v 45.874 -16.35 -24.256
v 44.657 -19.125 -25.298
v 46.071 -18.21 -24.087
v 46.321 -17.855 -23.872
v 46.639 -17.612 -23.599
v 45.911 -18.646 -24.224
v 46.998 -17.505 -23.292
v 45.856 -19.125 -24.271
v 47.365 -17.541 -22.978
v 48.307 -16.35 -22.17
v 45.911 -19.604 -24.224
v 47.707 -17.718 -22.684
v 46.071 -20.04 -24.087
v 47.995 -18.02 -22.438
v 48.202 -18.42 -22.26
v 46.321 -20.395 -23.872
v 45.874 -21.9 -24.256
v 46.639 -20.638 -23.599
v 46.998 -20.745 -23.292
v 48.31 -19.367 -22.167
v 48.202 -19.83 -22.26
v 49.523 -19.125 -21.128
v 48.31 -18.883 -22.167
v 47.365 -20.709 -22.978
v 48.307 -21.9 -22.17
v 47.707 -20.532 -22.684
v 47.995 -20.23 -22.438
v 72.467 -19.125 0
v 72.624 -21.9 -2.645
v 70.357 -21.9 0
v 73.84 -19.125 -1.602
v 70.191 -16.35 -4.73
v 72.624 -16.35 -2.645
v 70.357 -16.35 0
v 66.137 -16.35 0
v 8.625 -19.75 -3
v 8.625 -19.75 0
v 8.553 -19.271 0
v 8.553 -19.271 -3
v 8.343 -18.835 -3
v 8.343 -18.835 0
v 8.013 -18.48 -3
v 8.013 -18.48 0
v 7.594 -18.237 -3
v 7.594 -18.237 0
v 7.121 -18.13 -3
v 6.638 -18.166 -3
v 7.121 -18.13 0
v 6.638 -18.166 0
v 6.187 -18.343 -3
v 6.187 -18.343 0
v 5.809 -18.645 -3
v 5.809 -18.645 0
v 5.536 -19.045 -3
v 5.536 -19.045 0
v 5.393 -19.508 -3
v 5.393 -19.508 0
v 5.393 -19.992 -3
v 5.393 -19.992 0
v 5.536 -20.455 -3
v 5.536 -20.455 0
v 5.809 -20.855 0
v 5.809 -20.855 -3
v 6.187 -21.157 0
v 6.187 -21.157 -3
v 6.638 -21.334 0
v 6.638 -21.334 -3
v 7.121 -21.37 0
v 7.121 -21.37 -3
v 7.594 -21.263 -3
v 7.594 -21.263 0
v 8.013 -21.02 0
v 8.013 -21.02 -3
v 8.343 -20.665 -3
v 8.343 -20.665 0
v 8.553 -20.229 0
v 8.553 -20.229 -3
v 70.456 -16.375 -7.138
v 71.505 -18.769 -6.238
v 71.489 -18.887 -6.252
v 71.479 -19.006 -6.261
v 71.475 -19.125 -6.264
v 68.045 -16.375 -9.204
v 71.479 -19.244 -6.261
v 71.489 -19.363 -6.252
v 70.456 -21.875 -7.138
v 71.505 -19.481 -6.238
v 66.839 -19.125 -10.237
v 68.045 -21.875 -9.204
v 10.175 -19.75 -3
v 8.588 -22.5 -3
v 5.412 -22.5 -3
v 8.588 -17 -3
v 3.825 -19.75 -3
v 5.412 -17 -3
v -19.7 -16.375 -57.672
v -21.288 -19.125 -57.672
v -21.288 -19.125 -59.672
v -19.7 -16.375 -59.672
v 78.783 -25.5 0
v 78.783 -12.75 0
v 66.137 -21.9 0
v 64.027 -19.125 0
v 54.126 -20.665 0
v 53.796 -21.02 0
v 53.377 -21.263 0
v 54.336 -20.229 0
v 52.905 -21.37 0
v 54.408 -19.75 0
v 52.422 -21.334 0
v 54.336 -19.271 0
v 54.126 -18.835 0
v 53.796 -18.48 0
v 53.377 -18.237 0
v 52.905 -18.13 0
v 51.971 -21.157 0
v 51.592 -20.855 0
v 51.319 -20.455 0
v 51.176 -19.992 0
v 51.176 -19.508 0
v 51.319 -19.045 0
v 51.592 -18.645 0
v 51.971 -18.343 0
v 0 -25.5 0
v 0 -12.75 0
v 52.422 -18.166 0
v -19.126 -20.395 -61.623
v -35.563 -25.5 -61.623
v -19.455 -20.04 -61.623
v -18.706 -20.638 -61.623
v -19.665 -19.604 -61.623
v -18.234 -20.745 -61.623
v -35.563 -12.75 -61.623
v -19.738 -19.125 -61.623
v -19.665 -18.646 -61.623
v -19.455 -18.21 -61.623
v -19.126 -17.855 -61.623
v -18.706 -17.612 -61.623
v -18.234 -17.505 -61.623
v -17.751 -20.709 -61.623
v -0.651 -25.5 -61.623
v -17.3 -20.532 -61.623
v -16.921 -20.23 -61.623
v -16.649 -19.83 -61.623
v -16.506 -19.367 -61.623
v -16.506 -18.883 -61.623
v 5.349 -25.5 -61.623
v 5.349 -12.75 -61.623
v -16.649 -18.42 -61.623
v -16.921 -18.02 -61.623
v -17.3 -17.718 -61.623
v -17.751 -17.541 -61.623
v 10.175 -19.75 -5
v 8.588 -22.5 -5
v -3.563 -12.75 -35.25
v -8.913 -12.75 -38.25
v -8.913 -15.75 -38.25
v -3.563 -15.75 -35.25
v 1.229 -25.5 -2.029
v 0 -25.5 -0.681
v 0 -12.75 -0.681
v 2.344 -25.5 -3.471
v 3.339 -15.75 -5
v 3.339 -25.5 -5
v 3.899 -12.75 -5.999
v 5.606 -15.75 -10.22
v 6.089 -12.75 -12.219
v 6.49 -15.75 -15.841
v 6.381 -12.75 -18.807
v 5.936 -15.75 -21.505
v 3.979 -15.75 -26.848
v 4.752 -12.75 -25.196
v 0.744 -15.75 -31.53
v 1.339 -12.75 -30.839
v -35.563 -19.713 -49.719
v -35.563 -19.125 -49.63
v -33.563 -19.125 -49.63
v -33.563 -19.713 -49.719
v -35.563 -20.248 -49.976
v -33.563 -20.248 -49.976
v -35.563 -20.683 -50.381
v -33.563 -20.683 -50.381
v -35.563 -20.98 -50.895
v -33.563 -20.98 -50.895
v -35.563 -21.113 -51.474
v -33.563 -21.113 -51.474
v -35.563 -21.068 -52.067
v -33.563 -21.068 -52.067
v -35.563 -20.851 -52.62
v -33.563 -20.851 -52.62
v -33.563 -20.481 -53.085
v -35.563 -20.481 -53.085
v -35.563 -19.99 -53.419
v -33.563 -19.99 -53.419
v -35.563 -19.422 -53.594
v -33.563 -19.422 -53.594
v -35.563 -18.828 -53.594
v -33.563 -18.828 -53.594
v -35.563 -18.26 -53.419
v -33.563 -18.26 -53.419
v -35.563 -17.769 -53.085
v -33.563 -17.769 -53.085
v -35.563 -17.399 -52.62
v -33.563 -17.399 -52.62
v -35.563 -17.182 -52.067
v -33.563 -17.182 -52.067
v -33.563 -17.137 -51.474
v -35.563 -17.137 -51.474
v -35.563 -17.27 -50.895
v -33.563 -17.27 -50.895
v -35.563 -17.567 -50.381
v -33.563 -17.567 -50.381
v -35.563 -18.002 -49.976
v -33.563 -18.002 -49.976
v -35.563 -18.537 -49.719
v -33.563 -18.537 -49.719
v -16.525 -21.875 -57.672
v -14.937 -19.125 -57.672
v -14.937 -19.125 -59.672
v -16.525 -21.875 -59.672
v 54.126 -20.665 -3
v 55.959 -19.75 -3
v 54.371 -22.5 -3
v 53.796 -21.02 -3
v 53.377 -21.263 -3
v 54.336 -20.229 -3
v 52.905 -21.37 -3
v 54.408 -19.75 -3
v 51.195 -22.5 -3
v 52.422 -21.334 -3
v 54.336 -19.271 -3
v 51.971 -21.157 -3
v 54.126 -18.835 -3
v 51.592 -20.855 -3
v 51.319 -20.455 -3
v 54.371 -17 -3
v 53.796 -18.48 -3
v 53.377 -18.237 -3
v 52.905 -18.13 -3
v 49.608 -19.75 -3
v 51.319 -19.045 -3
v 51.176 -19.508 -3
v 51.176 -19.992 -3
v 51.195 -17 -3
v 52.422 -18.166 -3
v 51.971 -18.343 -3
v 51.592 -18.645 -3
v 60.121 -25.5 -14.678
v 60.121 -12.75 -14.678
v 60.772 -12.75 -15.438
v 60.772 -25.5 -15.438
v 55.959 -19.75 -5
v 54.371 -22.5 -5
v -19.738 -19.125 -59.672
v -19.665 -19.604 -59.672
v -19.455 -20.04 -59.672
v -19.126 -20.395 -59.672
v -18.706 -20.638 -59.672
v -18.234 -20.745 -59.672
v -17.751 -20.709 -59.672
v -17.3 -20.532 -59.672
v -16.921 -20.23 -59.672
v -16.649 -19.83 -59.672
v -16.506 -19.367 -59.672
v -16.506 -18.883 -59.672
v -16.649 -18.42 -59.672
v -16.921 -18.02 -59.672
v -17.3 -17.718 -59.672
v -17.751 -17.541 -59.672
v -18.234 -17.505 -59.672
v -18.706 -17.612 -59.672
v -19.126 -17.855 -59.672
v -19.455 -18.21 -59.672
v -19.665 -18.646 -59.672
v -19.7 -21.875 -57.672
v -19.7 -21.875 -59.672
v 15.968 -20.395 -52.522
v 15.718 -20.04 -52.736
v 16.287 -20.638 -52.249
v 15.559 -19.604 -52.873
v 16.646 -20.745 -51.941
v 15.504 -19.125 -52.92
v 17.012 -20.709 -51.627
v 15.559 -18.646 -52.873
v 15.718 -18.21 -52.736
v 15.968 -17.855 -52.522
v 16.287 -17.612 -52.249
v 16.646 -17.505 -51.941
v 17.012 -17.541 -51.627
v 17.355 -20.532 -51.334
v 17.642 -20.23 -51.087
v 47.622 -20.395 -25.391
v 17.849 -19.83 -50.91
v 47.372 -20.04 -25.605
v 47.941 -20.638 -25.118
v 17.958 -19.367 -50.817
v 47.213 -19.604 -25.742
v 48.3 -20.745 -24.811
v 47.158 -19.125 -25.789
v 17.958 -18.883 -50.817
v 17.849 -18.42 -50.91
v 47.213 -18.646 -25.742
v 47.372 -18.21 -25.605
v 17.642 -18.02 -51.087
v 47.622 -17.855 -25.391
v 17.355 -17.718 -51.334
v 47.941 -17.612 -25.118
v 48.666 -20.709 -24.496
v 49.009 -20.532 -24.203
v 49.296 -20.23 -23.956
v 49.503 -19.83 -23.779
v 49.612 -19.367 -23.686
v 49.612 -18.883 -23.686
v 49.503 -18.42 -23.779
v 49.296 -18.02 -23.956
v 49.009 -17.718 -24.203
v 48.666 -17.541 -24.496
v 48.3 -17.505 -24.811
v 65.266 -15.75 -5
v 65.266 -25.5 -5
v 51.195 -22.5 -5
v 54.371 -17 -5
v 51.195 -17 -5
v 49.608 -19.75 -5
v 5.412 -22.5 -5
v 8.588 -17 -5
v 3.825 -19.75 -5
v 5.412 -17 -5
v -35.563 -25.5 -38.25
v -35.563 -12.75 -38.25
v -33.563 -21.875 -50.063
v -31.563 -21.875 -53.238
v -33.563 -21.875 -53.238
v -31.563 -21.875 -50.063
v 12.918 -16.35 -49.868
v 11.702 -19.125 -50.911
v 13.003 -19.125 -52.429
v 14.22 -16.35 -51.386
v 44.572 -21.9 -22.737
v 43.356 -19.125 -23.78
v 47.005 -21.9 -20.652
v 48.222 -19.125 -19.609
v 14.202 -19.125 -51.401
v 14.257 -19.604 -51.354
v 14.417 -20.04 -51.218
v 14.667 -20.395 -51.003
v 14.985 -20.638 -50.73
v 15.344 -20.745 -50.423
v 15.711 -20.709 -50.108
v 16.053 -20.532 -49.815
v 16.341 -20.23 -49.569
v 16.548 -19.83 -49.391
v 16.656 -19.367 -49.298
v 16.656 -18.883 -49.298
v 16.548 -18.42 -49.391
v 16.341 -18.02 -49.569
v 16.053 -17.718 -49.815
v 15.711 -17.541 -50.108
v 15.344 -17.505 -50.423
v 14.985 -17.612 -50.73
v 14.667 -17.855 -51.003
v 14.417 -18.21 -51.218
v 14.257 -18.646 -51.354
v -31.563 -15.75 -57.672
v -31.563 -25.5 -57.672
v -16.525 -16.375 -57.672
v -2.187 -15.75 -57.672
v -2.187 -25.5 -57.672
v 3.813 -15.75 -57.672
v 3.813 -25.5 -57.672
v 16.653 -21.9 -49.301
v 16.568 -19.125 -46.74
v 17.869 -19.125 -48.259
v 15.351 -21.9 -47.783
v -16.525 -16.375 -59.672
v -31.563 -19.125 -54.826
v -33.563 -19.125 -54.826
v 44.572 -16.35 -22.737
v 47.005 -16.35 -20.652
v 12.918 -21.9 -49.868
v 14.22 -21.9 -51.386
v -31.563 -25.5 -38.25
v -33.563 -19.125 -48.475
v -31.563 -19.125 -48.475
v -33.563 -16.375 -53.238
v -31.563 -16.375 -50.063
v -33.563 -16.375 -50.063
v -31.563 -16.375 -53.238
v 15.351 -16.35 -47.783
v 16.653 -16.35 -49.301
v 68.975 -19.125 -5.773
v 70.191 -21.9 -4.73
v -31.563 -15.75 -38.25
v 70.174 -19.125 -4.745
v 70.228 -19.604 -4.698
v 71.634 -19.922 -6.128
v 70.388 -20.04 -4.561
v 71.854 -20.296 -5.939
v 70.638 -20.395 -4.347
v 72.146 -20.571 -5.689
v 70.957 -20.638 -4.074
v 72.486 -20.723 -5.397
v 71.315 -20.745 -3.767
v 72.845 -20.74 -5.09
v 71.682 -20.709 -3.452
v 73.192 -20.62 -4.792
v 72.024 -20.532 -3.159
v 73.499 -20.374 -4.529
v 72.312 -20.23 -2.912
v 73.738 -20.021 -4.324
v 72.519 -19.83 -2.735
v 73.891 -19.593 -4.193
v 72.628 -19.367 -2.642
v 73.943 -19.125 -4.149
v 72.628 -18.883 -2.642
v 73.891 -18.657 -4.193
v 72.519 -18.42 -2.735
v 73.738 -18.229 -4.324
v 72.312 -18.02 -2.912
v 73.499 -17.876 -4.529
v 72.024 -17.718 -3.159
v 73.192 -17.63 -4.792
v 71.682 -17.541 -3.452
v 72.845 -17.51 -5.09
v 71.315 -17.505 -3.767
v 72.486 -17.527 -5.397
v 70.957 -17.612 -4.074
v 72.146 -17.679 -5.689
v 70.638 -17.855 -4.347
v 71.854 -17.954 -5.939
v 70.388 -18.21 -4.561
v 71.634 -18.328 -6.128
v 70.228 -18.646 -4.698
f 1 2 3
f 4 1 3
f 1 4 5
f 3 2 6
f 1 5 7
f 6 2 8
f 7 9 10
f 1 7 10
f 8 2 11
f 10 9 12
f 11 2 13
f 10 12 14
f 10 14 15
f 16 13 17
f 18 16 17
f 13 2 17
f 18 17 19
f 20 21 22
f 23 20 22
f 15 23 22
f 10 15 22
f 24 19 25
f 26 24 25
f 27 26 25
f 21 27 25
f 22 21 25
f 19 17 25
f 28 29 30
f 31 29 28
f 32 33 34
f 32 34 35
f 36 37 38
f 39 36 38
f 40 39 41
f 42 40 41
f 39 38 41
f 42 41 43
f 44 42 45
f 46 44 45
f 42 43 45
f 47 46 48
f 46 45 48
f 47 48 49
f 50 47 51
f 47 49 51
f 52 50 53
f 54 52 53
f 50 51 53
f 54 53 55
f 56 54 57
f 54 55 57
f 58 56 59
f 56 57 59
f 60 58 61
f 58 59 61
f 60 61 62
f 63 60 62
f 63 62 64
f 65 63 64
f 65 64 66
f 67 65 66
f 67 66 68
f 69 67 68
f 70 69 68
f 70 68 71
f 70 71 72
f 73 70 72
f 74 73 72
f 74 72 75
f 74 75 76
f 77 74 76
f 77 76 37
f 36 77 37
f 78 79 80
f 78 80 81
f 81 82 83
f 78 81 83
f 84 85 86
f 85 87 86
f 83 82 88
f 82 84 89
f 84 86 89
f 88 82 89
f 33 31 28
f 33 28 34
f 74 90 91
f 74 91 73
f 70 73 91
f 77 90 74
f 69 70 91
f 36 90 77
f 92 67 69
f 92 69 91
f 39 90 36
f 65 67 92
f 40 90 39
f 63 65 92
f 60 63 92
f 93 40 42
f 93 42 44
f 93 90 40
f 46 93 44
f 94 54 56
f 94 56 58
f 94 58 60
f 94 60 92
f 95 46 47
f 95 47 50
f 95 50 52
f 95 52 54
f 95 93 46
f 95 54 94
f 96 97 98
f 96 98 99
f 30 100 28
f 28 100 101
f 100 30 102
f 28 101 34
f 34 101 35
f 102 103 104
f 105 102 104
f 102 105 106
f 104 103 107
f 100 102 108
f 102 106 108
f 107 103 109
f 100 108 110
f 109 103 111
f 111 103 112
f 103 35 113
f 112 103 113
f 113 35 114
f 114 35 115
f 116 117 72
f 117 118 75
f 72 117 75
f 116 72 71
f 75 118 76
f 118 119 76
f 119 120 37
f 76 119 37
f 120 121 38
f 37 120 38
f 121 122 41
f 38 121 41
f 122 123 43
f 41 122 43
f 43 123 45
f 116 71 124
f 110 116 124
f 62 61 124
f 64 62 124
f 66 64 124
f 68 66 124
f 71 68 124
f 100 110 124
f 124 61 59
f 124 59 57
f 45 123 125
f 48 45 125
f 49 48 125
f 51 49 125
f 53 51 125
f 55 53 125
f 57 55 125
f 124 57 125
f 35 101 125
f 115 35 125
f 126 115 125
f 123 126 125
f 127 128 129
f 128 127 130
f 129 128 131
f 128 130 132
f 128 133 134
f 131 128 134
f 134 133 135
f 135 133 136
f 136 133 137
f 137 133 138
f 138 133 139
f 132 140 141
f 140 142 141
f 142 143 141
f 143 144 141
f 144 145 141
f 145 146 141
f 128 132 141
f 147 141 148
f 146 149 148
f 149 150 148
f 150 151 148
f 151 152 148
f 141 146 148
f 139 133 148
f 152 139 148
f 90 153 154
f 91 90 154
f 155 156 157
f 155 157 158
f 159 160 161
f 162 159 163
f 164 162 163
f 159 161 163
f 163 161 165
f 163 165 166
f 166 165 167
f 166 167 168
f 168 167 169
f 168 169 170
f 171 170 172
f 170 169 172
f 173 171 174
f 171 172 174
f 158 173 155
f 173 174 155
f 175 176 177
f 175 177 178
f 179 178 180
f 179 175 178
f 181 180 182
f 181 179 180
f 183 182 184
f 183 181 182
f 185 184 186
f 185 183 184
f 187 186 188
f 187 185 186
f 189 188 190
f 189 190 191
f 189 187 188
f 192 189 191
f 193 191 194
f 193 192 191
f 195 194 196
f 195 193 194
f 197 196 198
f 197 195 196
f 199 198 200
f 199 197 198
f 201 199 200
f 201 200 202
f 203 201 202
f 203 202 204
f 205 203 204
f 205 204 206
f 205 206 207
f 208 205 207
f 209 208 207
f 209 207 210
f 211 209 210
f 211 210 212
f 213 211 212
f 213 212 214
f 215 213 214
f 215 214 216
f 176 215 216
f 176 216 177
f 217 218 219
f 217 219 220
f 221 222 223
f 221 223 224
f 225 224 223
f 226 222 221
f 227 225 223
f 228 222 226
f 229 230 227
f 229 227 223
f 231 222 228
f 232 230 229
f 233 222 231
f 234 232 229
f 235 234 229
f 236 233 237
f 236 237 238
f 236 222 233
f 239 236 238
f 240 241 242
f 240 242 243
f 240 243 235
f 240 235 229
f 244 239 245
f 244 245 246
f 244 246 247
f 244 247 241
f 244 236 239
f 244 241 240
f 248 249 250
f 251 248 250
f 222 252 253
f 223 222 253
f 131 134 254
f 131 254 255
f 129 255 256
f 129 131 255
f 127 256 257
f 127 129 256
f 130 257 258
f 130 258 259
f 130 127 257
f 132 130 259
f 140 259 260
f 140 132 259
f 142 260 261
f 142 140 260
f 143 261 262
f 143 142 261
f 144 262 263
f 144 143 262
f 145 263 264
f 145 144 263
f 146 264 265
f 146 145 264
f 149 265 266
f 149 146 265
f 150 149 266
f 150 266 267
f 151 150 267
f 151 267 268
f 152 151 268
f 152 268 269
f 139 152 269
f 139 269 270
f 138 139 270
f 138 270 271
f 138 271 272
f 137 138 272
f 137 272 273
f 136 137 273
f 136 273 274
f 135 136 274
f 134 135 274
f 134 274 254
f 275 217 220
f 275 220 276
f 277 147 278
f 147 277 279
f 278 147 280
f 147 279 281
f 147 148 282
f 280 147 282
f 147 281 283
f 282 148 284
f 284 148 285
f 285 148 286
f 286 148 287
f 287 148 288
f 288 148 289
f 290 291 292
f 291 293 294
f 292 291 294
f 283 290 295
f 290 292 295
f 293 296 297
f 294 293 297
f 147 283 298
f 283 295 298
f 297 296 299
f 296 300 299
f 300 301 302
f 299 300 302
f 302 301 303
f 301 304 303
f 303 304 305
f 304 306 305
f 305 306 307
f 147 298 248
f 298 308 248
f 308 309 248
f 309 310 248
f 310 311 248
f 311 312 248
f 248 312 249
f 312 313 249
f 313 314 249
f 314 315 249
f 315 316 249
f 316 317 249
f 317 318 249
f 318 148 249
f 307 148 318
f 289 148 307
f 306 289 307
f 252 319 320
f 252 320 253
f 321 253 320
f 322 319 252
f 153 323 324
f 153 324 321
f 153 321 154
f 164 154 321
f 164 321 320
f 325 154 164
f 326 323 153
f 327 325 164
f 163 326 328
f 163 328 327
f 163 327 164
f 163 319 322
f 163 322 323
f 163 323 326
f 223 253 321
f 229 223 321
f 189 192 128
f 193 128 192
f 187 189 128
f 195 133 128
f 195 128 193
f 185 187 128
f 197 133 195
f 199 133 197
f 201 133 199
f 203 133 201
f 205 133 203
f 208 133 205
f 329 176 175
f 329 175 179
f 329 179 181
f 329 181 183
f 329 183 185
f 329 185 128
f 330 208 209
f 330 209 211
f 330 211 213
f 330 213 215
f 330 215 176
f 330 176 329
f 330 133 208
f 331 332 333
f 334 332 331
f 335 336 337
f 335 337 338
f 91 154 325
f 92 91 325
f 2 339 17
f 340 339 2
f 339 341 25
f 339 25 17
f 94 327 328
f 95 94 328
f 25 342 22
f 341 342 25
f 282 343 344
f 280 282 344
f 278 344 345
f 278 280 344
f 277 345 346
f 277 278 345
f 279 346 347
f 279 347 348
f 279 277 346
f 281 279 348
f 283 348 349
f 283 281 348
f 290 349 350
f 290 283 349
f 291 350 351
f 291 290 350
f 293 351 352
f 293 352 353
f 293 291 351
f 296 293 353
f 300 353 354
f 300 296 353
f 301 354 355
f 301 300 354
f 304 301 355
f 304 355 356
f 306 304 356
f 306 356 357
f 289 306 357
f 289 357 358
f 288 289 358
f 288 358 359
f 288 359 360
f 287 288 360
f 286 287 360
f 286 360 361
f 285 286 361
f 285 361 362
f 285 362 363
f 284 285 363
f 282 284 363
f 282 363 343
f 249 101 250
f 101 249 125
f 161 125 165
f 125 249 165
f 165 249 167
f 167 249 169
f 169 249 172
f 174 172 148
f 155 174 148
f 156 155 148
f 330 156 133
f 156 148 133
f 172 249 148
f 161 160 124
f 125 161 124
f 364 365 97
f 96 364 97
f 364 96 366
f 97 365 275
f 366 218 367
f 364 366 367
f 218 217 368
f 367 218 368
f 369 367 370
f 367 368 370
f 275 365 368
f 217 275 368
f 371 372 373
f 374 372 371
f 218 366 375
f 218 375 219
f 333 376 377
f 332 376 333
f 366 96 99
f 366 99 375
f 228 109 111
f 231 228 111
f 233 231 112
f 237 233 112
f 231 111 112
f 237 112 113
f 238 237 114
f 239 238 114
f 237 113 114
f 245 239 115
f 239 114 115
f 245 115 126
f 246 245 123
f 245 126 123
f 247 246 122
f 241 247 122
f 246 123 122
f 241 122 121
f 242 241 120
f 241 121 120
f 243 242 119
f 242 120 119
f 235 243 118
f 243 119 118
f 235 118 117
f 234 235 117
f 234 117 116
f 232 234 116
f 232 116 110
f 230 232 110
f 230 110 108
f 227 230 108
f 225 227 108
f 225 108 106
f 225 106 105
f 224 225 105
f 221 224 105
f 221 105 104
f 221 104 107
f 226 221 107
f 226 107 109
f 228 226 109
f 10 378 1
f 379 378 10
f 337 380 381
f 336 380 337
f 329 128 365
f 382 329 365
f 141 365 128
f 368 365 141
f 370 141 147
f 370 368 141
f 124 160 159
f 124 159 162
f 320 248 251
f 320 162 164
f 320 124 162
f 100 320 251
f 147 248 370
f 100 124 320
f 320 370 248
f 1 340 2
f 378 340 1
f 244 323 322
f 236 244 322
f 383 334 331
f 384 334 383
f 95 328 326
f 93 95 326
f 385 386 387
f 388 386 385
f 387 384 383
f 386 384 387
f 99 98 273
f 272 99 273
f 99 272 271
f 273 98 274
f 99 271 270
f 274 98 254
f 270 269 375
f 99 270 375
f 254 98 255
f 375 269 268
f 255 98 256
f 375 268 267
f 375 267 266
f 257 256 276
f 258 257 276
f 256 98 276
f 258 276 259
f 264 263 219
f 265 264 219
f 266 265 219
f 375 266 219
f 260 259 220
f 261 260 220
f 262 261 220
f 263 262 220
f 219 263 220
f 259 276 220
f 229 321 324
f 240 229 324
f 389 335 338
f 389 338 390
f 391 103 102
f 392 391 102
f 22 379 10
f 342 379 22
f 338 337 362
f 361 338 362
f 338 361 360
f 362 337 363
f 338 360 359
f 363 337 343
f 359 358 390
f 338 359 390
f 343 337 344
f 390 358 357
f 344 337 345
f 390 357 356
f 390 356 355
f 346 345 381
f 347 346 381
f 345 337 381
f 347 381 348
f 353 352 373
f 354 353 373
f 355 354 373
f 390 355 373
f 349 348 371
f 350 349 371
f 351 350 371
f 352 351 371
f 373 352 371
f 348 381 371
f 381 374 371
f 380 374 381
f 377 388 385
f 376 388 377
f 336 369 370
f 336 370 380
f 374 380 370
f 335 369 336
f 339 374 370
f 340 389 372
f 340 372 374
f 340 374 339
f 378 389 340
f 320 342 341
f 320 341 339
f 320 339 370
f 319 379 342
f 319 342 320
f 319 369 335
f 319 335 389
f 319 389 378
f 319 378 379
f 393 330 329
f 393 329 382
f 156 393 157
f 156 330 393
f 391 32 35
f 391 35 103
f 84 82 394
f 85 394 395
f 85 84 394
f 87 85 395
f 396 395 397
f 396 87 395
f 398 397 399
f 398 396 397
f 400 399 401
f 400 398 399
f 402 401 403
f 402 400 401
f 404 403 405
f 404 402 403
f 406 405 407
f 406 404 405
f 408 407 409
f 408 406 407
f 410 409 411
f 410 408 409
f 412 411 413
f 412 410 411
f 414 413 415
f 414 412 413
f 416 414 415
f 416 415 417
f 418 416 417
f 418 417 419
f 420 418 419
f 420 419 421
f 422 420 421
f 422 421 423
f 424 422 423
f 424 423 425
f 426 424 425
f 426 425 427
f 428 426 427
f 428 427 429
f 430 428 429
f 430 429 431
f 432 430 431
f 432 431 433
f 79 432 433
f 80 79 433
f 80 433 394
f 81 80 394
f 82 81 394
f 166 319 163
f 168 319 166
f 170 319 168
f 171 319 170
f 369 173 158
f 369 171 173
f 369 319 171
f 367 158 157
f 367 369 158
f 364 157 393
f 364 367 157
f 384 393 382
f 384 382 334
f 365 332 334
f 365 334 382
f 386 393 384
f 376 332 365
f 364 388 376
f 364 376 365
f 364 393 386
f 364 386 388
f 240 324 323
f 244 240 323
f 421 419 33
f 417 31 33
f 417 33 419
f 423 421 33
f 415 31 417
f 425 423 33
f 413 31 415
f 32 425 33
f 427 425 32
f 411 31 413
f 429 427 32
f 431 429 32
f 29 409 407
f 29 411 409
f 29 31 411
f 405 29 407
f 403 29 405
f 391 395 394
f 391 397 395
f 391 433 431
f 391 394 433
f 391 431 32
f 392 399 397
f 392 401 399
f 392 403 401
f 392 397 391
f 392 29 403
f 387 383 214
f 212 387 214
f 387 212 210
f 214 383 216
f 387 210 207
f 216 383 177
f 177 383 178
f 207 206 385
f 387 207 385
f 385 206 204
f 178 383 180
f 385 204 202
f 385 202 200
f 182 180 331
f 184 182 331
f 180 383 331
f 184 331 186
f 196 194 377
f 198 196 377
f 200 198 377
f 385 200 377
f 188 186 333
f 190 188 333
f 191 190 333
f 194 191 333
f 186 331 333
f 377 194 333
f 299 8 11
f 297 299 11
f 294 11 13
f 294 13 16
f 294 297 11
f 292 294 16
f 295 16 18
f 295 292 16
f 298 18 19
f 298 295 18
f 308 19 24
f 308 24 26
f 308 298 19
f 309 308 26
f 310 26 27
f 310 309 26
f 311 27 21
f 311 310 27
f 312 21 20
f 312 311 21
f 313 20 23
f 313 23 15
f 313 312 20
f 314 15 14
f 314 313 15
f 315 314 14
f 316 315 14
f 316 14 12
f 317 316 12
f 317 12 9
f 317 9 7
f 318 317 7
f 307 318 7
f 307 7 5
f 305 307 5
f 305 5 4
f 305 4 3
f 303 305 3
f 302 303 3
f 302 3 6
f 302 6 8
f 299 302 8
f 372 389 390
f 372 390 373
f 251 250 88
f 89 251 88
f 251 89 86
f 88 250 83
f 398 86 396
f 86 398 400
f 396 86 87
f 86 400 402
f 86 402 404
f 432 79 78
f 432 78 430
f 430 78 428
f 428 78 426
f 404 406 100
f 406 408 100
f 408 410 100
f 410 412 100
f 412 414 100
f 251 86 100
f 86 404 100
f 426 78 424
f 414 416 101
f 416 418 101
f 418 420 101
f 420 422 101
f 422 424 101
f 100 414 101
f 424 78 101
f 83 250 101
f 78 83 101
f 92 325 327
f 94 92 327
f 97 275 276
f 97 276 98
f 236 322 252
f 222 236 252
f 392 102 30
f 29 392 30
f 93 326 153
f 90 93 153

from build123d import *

# Parameters (mm, degrees)
SALIENTE_EXTRUIR1_DEPTH     = 12.75
CORTAR_EXTRUIR1_REACH       = 31.62
CROQUIS2_R                  = 1.625
CROQUIS3_R                  = 22.5
CORTAR_EXTRUIR2_DEPTH       = 13.75
SALIENTE_EXTRUIR2_DEPTH     = 3
SALIENTE_EXTRUIR3_DEPTH     = 9.75
CROQUIS6_R                  = 1.625
CORTAR_EXTRUIR3_DEPTH       = 10
CORTAR_EXTRUIR4_START       = -2
CORTAR_EXTRUIR4_DEPTH       = 10
CORTAR_EXTRUIR5_START       = -2
CORTAR_EXTRUIR5_DEPTH       = 10
CORTAR_EXTRUIR6_DEPTH       = 2
CORTAR_EXTRUIR7_REACH       = 37.25
CROQUIS10_R                 = 1.625
CORTAR_EXTRUIR8_DEPTH       = 2
CROQUIS12_W                 = 92.508691999
CROQUIS12_H                 = 24.255818813
CORTAR_EXTRUIR9_DEPTH       = 1
CORTAR_EXTRUIR9_DEPTH_BACK  = 36.25
SALIENTE_EXTRUIR4_DEPTH     = 12.75
CORTAR_EXTRUIR10_START      = -9.75
CORTAR_EXTRUIR10_DEPTH      = 9.75
CROQUIS16_W                 = 76.692813467
CROQUIS16_H                 = 12.75
CORTAR_EXTRUIR11_DEPTH      = 1
CROQUIS17_W                 = 40.657498706
CROQUIS17_H                 = 22.934549925
CORTAR_EXTRUIR12_DEPTH      = 1
CORTAR_EXTRUIR12_DEPTH_BACK = 13.75
SALIENTE_EXTRUIR5_REACH     = 14.75
CROQUIS18_W                 = 34.9120451
CROQUIS18_H                 = 3.951156815
CROQUIS20_R                 = 1.625
CORTAR_EXTRUIR14_DEPTH      = 10
CORTAR_EXTRUIR15_DEPTH      = 2
CROQUIS22_R                 = 1.625
CORTAR_EXTRUIR16_DEPTH      = 10
CORTAR_EXTRUIR17_DEPTH      = 2
SALIENTE_EXTRUIR6_DEPTH     = 12.75
CORTAR_EXTRUIR18_DEPTH      = 2
CROQUIS28_R                 = 1.625
SALIENTE_EXTRUIR7_DEPTH     = 1
CORTAR_EXTRUIR19_REACH      = 110.346
CROQUIS29_R                 = 1.993280097
CORTAR_EXTRUIR20_DEPTH      = 2
SALIENTE_EXTRUIR8_DEPTH     = 12.75
SALIENTE_EXTRUIR9_START     = -2.904645
SALIENTE_EXTRUIR9_DEPTH     = 5
SALIENTE_EXTRUIR10_REACH    = 76.413
CORTAR_EXTRUIR21_START      = -9.75
CORTAR_EXTRUIR21_DEPTH      = 9.75
CROQUIS36_R                 = 1.625
CORTAR_EXTRUIR22_DEPTH      = 15
CORTAR_EXTRUIR23_DEPTH      = 2
CORTAR_EXTRUIR24_START      = -2
CORTAR_EXTRUIR24_DEPTH      = 73.413335578
CROQUIS19_W                 = 120.448667976
CROQUIS19_H                 = 32.886651308
CORTAR_EXTRUIR13_DEPTH      = 1
CORTAR_EXTRUIR13_DEPTH_BACK = 62.623336743


with BuildPart() as part:
    # Croquis1 → Saliente-Extruir1 (new body)
    with BuildSketch(Plane(origin=(0, 0, 0), x_dir=(1, 0, 0), z_dir=(0, 1, 0))):
        Polygon((0, 0), (72.78319995, 0), (38.224450787, 29.62043043), (35.621353918, 26.5833452), (60.803074847, 5), (0, 5), align=None)
    extrude(amount=SALIENTE_EXTRUIR1_DEPTH)

    # Croquis2 → Cortar-Extruir1 (cut, up to next)
    with BuildSketch(Plane.XY, mode=Mode.PRIVATE) as cortar_extruir1_sk1:
        with Locations((52.78319995, 5.75)):
            Circle(CROQUIS2_R)
    cortar_extruir1_tool1 = extrude(cortar_extruir1_sk1.sketch, amount=-CORTAR_EXTRUIR1_REACH, mode=Mode.PRIVATE) & part.part
    add(cortar_extruir1_tool1.solids().sort_by_distance((52.7832, 5.75, 0))[0], mode=Mode.SUBTRACT)
    # Croquis2 → Cortar-Extruir1 (cut, up to next)
    with BuildSketch(Plane.XY, mode=Mode.PRIVATE) as cortar_extruir1_sk2:
        with Locations((6.99999995, 5.75)):
            Circle(CROQUIS2_R)
    cortar_extruir1_tool2 = extrude(cortar_extruir1_sk2.sketch, amount=-CORTAR_EXTRUIR1_REACH, mode=Mode.PRIVATE) & part.part
    add(cortar_extruir1_tool2.solids().sort_by_distance((7, 5.75, 0))[0], mode=Mode.SUBTRACT)

    # Croquis3 → Cortar-Extruir2 (cut, through all)
    with BuildSketch(Plane(origin=(0, 12.75, 0), x_dir=(1, 0, 0), z_dir=(0, 1, 0))):
        with Locations((-16, 16.5)):
            Circle(CROQUIS3_R)
    extrude(amount=-CORTAR_EXTRUIR2_DEPTH, mode=Mode.SUBTRACT)

    # Croquis4 → Saliente-Extruir2 (add)
    with BuildSketch(Plane(origin=(0, 12.75, 0), x_dir=(1, 0, 0), z_dir=(0, 1, 0))):
        with BuildLine():
            Line((38.224450787, 29.62043043), (31.656319269, 35.25))
            Line((31.656319269, 35.25), (-3.562657036, 35.25))
            ThreePointArc((-3.562657036, 35.25), (5.936291456, 21.504909307), (3.339079606, 5))
            Line((3.339079606, 5), (60.803074847, 5))
            Line((60.803074847, 5), (35.621353918, 26.5833452))
            Line((35.621353918, 26.5833452), (38.224450787, 29.62043043))
        make_face()
    extrude(amount=-SALIENTE_EXTRUIR2_DEPTH)

    # Croquis5 → Saliente-Extruir3 (add)
    with BuildSketch(Plane.XZ.offset(-9.75)):
        with BuildLine():
            Line((-3.562657036, -35.25), (31.656319269, -35.25))
            Line((31.656319269, -35.25), (38.224450787, -29.62043043))
            Line((38.224450787, -29.62043043), (35.621353918, -26.5833452))
            Line((35.621353918, -26.5833452), (30.17667434, -31.25))
            Line((30.17667434, -31.25), (0.990806338, -31.25))
            ThreePointArc((0.990806338, -31.25), (-1.15062315, -33.404023402), (-3.562657036, -35.25))
        make_face()
    extrude(amount=SALIENTE_EXTRUIR3_DEPTH)

    # Croquis6 → Cortar-Extruir3 (cut)
    with BuildSketch(Plane(origin=(30.824200619, 0, -35.963211942), x_dir=(-0.759271307, 0, -0.650774217), z_dir=(0.650774217, 0, -0.759271307))):
        with Locations((-47.262195378, 6.375)):
            Circle(CROQUIS6_R)
        with Locations((-16.095943758, 6.375)):
            Circle(CROQUIS6_R)
    extrude(amount=-CORTAR_EXTRUIR3_DEPTH, mode=Mode.SUBTRACT)

    # Croquis7 → Cortar-Extruir4 (cut)
    with BuildSketch(Plane(origin=(28.22110375, 0, -32.926126712), x_dir=(0.759271307, 0, 0.650774217), z_dir=(-0.650774217, 0, 0.759271307)).offset(CORTAR_EXTRUIR4_START)):
        Polygon((48.849908618, 3.625), (50.437621859, 6.375), (48.849908618, 9.125), (45.674482138, 9.125), (44.086768898, 6.375), (45.674482138, 3.625), align=None)
    extrude(amount=CORTAR_EXTRUIR4_DEPTH, mode=Mode.SUBTRACT)

    # Croquis8 → Cortar-Extruir5 (cut)
    with BuildSketch(Plane(origin=(28.22110375, 0, -32.926126712), x_dir=(0.759271307, 0, 0.650774217), z_dir=(-0.650774217, 0, 0.759271307)).offset(CORTAR_EXTRUIR5_START)):
        Polygon((17.683656999, 3.625), (19.271370239, 6.375), (17.683656999, 9.125), (14.508230518, 9.125), (12.920517278, 6.375), (14.508230518, 3.625), align=None)
    extrude(amount=CORTAR_EXTRUIR5_DEPTH, mode=Mode.SUBTRACT)

    # Croquis9 → Cortar-Extruir6 (cut)
    with BuildSketch(Plane(origin=(0, 0, -5), x_dir=(-1, 0, 0), z_dir=(0, 0, -1))):
        Polygon((-5.41228671, 3), (-3.824573469, 5.75), (-5.41228671, 8.5), (-8.58771319, 8.5), (-10.175426431, 5.75), (-8.58771319, 3), align=None)
        Polygon((-51.19548671, 3), (-49.607773469, 5.75), (-51.19548671, 8.5), (-54.37091319, 8.5), (-55.958626431, 5.75), (-54.37091319, 3), align=None)
    extrude(amount=-CORTAR_EXTRUIR6_DEPTH, mode=Mode.SUBTRACT)

    # Croquis10 → Cortar-Extruir7 (cut, up to next)
    with BuildSketch(Plane(origin=(0, 0, -35.25), x_dir=(-1, 0, 0), z_dir=(0, 0, -1)), mode=Mode.PRIVATE) as cortar_extruir7_sk1:
        with Locations((-21.656319269, 6.375)):
            Circle(CROQUIS10_R)
    cortar_extruir7_tool1 = extrude(cortar_extruir7_sk1.sketch, amount=-CORTAR_EXTRUIR7_REACH, mode=Mode.PRIVATE) & part.part
    add(cortar_extruir7_tool1.solids().sort_by_distance((21.656319, 6.375, -35.25))[0], mode=Mode.SUBTRACT)

    # Croquis11 → Cortar-Extruir8 (cut)
    with BuildSketch(Plane.XY.offset(-31.25)):
        Polygon((23.24403251, 3.625), (24.83174575, 6.375), (23.24403251, 9.125), (20.068606029, 9.125), (18.480892789, 6.375), (20.068606029, 3.625), align=None)
    extrude(amount=-CORTAR_EXTRUIR8_DEPTH, mode=Mode.SUBTRACT)

    # Simetría1: part across plane


with BuildPart() as part_1:
    add(part.part)
    add(part.part.mirror(Plane.ZX))

    # Croquis12 → Cortar-Extruir9 (cut, two sides)
    with BuildSketch(Plane(origin=(0, 0, -35.25), x_dir=(-1, 0, 0), z_dir=(0, 0, -1))) as cortar_extruir9_sk:
        with Locations((-33.077560565, 12.127909407)):
            Rectangle(CROQUIS12_W, CROQUIS12_H)
    extrude(amount=CORTAR_EXTRUIR9_DEPTH, mode=Mode.SUBTRACT)
    extrude(cortar_extruir9_sk.sketch, amount=-CORTAR_EXTRUIR9_DEPTH_BACK, mode=Mode.SUBTRACT)

    # Croquis13 → Saliente-Extruir4 (add)
    with BuildSketch(Plane.XZ.offset(12.75)):
        Polygon((-35.562657036, -82.38260805), (-35.562657036, -38.25), (-8.913300435, -38.25), (-3.562657036, -35.25), (31.656319269, -35.25), (0.000162281, -62.38260805), align=None)
    extrude(amount=-SALIENTE_EXTRUIR4_DEPTH)

    # Croquis14 → Cortar-Extruir10 (cut)
    with BuildSketch(Plane(origin=(0, 0, 0), x_dir=(1, 0, 0), z_dir=(0, 1, 0)).offset(CORTAR_EXTRUIR10_START)):
        Polygon((30.17667434, 31.25), (0.990806338, 31.25), (-31.562657036, 38.25), (-31.562657036, 75.543902968), (-2.303881466, 59.089203295), align=None)
    extrude(amount=CORTAR_EXTRUIR10_DEPTH, mode=Mode.SUBTRACT)

    # Croquis16 → Cortar-Extruir11 (cut)
    with BuildSketch(Plane(origin=(30.824200619, 0, -35.963211942), x_dir=(-0.759271307, 0, -0.650774217), z_dir=(0.650774217, 0, -0.759271307))):
        with Locations((2.250462975, -6.375)):
            Rectangle(CROQUIS16_W, CROQUIS16_H)
    extrude(amount=-CORTAR_EXTRUIR11_DEPTH, mode=Mode.SUBTRACT)

    # Croquis17 → Cortar-Extruir12 (cut, two sides)
    with BuildSketch(Plane.XZ.offset(12.75)) as cortar_extruir12_sk:
        with Locations((-20.328587072, -73.090611706)):
            Rectangle(CROQUIS17_W, CROQUIS17_H)
    extrude(amount=CORTAR_EXTRUIR12_DEPTH, mode=Mode.SUBTRACT)
    extrude(cortar_extruir12_sk.sketch, amount=-CORTAR_EXTRUIR12_DEPTH_BACK, mode=Mode.SUBTRACT)

    # Croquis18 → Saliente-Extruir5 (add, up to next)
    with BuildSketch(Plane(origin=(0, 0, 0), x_dir=(1, 0, 0), z_dir=(0, 1, 0)), mode=Mode.PRIVATE) as saliente_extruir5_sk1:
        with Locations((-18.106634486, 59.647758336)):
            Rectangle(CROQUIS18_W, CROQUIS18_H)
    saliente_extruir5_tool1 = extrude(saliente_extruir5_sk1.sketch, amount=-SALIENTE_EXTRUIR5_REACH, mode=Mode.PRIVATE) - part_1.part
    add(saliente_extruir5_tool1.solids().sort_by_distance((-18.106634, 0, -59.647758))[0])

    # Croquis20 → Cortar-Extruir14 (cut)
    with BuildSketch(Plane(origin=(30.173426402, 0, -35.203940634), x_dir=(-0.759271307, 0, -0.650774217), z_dir=(0.650774217, 0, -0.759271307))):
        with Locations((25.596869709, -6.375)):
            Circle(CROQUIS20_R)
        with Locations((-16.095943758, -6.375)):
            Circle(CROQUIS20_R)
    extrude(amount=-CORTAR_EXTRUIR14_DEPTH, mode=Mode.SUBTRACT)

    # Croquis21 → Cortar-Extruir15 (cut)
    with BuildSketch(Plane(origin=(28.22110375, 0, -32.926126712), x_dir=(0.759271307, 0, 0.650774217), z_dir=(-0.650774217, 0, 0.759271307))):
        Polygon((-24.009156469, -9.125), (-22.421443229, -6.375), (-24.009156469, -3.625), (-27.184582949, -3.625), (-28.77229619, -6.375), (-27.184582949, -9.125), align=None)
    extrude(amount=-CORTAR_EXTRUIR15_DEPTH, mode=Mode.SUBTRACT)

    # Croquis22 → Cortar-Extruir16 (cut)
    with BuildSketch(Plane(origin=(0, 0, -61.623336743), x_dir=(-1, 0, 0), z_dir=(0, 0, -1))):
        with Locations((18.112657036, -6.375)):
            Circle(CROQUIS22_R)
    extrude(amount=-CORTAR_EXTRUIR16_DEPTH, mode=Mode.SUBTRACT)

    # Croquis23 → Cortar-Extruir17 (cut)
    with BuildSketch(Plane.XY.offset(-57.672179928)):
        Polygon((-16.524943796, -9.125), (-14.937230556, -6.375), (-16.524943796, -3.625), (-19.700370276, -3.625), (-21.288083517, -6.375), (-19.700370276, -9.125), align=None)
    extrude(amount=-CORTAR_EXTRUIR17_DEPTH, mode=Mode.SUBTRACT)

    # Croquis26 → Saliente-Extruir6 (add)
    with BuildSketch(Plane(origin=(0, 0, 0), x_dir=(1, 0, 0), z_dir=(0, 1, 0))):
        Polygon((60.803074847, 5), (-2.287792345, 59.07541325), (-2.938566562, 58.316141943), (60.15230063, 4.240728693), align=None)
    extrude(amount=-SALIENTE_EXTRUIR6_DEPTH)

    # Croquis27 → Cortar-Extruir18 (cut)
    with BuildSketch(Plane(origin=(27.570329533, 0, -32.166855405), x_dir=(0.759271307, 0, 0.650774217), z_dir=(-0.650774217, 0, 0.759271307))):
        Polygon((-22.421443229, -6.375), (-24.009156469, -3.625), (-27.184582949, -3.625), (-28.77229619, -6.375), (-27.184582949, -9.125), (-24.009156469, -9.125), align=None)
        Polygon((19.271370239, -6.375), (17.683656999, -3.625), (14.508230518, -3.625), (12.920517278, -6.375), (14.508230518, -9.125), (17.683656999, -9.125), align=None)
    extrude(amount=-CORTAR_EXTRUIR18_DEPTH, mode=Mode.SUBTRACT)

    # Croquis28 → Saliente-Extruir7 (add)
    with BuildSketch(Plane(origin=(29.522652185, 0, -34.444669327), x_dir=(0.759271307, 0, 0.650774217), z_dir=(-0.650774217, 0, 0.759271307))):
        Polygon((-24.009156469, -3.625), (-27.184582949, -3.625), (-28.77229619, -6.375), (-27.184582949, -9.125), (-24.009156469, -9.125), (-22.421443229, -6.375), align=None)
        with Locations((-25.596869709, -6.375)):
            Circle(CROQUIS28_R, mode=Mode.SUBTRACT)
        Polygon((17.683656999, -3.625), (14.508230518, -3.625), (12.920517278, -6.375), (14.508230518, -9.125), (17.683656999, -9.125), (19.271370239, -6.375), align=None)
        with Locations((16.095943758, -6.375)):
            Circle(CROQUIS28_R, mode=Mode.SUBTRACT)
    extrude(amount=SALIENTE_EXTRUIR7_DEPTH)

    # Croquis29 → Cortar-Extruir19 (cut, up to next)
    with BuildSketch(Plane.ZY.offset(35.562657036), mode=Mode.PRIVATE) as cortar_extruir19_sk1:
        with Locations((-51.623336743, -6.375)):
            Circle(CROQUIS29_R)
    cortar_extruir19_tool1 = extrude(cortar_extruir19_sk1.sketch, amount=-CORTAR_EXTRUIR19_REACH, mode=Mode.PRIVATE) & part_1.part
    add(cortar_extruir19_tool1.solids().sort_by_distance((-35.562657, -6.375, -51.623337))[0], mode=Mode.SUBTRACT)

    # Croquis30 → Cortar-Extruir20 (cut)
    with BuildSketch(Plane(origin=(-31.562657036, 0, 0), x_dir=(0, 0, -1), z_dir=(1, 0, 0))):
        Polygon((53.238108484, -9.125), (54.825821725, -6.375), (53.238108484, -3.625), (50.062682004, -3.625), (48.474968763, -6.375), (50.062682004, -9.125), align=None)
    extrude(amount=-CORTAR_EXTRUIR20_DEPTH, mode=Mode.SUBTRACT)

    # Croquis32 → Saliente-Extruir8 (add)
    with BuildSketch(Plane.XZ.offset(12.75)):
        Polygon((-0.650611936, -61.623336743), (5.349388064, -61.623336743), (60.1210833, -14.678316233), (60.771857517, -15.43758754), (78.78319995, 0), (72.78319995, 0), (58.230815026, -12.472902396), (57.580040809, -11.713631088), align=None)
    extrude(amount=-SALIENTE_EXTRUIR8_DEPTH)

    # Croquis33 → Saliente-Extruir9 (add)
    with BuildSketch(Plane(origin=(32.714468893, 0, -38.168625779), x_dir=(-0.759271307, 0, -0.650774217), z_dir=(0.650774217, 0, -0.759271307)).offset(SALIENTE_EXTRUIR9_START)):
        Polygon((-14.508230518, -3.625), (-17.683656999, -3.625), (-19.271370239, -6.375), (-17.683656999, -9.125), (-14.508230518, -9.125), (-12.920517278, -6.375), align=None)
        Polygon((27.184582949, -3.625), (24.009156469, -3.625), (22.421443229, -6.375), (24.009156469, -9.125), (27.184582949, -9.125), (28.77229619, -6.375), align=None)
    extrude(amount=-SALIENTE_EXTRUIR9_DEPTH)

    # Saliente-Extruir10: up to this face of the body (flat: up to its plane)
    saliente_extruir10_end = Plane(part_1.part.faces().sort_by_distance((38.729797406, -6.385876659, 0))[0])
    # Croquis34 → Saliente-Extruir10 (add, up to the picked face)
    with BuildSketch(Plane(origin=(33.36524311, 0, -38.927897086), x_dir=(-0.759271307, 0, -0.650774217), z_dir=(0.650774217, 0, -0.759271307)), mode=Mode.PRIVATE) as saliente_extruir10_sk1:
        Polygon((-45.674482138, -3.625), (-48.849908618, -3.625), (-50.437621859, -6.375), (-48.849908618, -9.125), (-45.674482138, -9.125), (-44.086768898, -6.375), align=None)
    saliente_extruir10_tool1 = split(extrude(saliente_extruir10_sk1.sketch, amount=-SALIENTE_EXTRUIR10_REACH, mode=Mode.PRIVATE), bisect_by=saliente_extruir10_end, keep=Keep.BOTH, mode=Mode.PRIVATE)
    add(saliente_extruir10_tool1.solids().sort_by_distance((69.250072, -6.375, -8.170879))[0])

    # Croquis35 → Cortar-Extruir21 (cut)
    with BuildSketch(Plane(origin=(0, 0, 0), x_dir=(1, 0, 0), z_dir=(0, 1, 0)).offset(CORTAR_EXTRUIR21_START)):
        Polygon((-2.187243188, 57.672179928), (3.812756812, 57.672179928), (65.266443595, 5), (59.266443595, 5), align=None)
    extrude(amount=CORTAR_EXTRUIR21_DEPTH, mode=Mode.SUBTRACT)

    # Croquis36 → Cortar-Extruir22 (cut)
    with BuildSketch(Plane(origin=(33.36524311, 0, -38.927897086), x_dir=(-0.759271307, 0, -0.650774217), z_dir=(0.650774217, 0, -0.759271307))):
        with Locations((-51.817823222, -6.375)):
            Circle(CROQUIS36_R)
        with Locations((-20.647823222, -6.375)):
            Circle(CROQUIS36_R)
        with Locations((21.042176778, -6.375)):
            Circle(CROQUIS36_R)
    extrude(amount=-CORTAR_EXTRUIR22_DEPTH, mode=Mode.SUBTRACT)

    # Croquis38 → Cortar-Extruir23 (cut)
    with BuildSketch(Plane(origin=(30.111372024, 0, -35.131540549), x_dir=(0.759271307, 0, 0.650774217), z_dir=(-0.650774217, 0, 0.759271307))):
        Polygon((-19.440029781, -9.15), (-17.837882784, -6.375), (-19.440029781, -3.6), (-22.644323775, -3.6), (-24.246470772, -6.375), (-22.644323775, -9.15), align=None)
        Polygon((22.249970219, -9.15), (23.852117216, -6.375), (22.249970219, -3.6), (19.045676225, -3.6), (17.443529228, -6.375), (19.045676225, -9.15), align=None)
    extrude(amount=-CORTAR_EXTRUIR23_DEPTH, mode=Mode.SUBTRACT)

    # Croquis39 → Cortar-Extruir24 (cut, through all)
    with BuildSketch(Plane(origin=(33.36524311, 0, -38.927897086), x_dir=(-0.759271307, 0, -0.650774217), z_dir=(0.650774217, 0, -0.759271307)).offset(CORTAR_EXTRUIR24_START)):
        Polygon((-50.215676225, -9.15), (-48.613529228, -6.375), (-50.215676225, -3.6), (-53.419970219, -3.6), (-55.022117216, -6.375), (-53.419970219, -9.15), align=None)
    extrude(amount=-CORTAR_EXTRUIR24_DEPTH, mode=Mode.SUBTRACT)

    # Simetría2: part across face


with BuildPart() as part_2:
    add(part_1.part)
    add(part_1.part.mirror(Plane(origin=(15.909867024, -12.75, -29.216307939), x_dir=(0, 0, 1), z_dir=(0, -1, 0))))

    # Croquis19 → Cortar-Extruir13 (cut, two sides)
    with BuildSketch(Plane(origin=(0, 0, -61.623336743), x_dir=(-1, 0, 0), z_dir=(0, 0, -1))) as cortar_extruir13_sk:
        with Locations((-18.558865962, 3.693325654)):
            Rectangle(CROQUIS19_W, CROQUIS19_H)
    extrude(amount=CORTAR_EXTRUIR13_DEPTH, mode=Mode.SUBTRACT)
    extrude(cortar_extruir13_sk.sketch, amount=-CORTAR_EXTRUIR13_DEPTH_BACK, mode=Mode.SUBTRACT)


solid = part_2.part
